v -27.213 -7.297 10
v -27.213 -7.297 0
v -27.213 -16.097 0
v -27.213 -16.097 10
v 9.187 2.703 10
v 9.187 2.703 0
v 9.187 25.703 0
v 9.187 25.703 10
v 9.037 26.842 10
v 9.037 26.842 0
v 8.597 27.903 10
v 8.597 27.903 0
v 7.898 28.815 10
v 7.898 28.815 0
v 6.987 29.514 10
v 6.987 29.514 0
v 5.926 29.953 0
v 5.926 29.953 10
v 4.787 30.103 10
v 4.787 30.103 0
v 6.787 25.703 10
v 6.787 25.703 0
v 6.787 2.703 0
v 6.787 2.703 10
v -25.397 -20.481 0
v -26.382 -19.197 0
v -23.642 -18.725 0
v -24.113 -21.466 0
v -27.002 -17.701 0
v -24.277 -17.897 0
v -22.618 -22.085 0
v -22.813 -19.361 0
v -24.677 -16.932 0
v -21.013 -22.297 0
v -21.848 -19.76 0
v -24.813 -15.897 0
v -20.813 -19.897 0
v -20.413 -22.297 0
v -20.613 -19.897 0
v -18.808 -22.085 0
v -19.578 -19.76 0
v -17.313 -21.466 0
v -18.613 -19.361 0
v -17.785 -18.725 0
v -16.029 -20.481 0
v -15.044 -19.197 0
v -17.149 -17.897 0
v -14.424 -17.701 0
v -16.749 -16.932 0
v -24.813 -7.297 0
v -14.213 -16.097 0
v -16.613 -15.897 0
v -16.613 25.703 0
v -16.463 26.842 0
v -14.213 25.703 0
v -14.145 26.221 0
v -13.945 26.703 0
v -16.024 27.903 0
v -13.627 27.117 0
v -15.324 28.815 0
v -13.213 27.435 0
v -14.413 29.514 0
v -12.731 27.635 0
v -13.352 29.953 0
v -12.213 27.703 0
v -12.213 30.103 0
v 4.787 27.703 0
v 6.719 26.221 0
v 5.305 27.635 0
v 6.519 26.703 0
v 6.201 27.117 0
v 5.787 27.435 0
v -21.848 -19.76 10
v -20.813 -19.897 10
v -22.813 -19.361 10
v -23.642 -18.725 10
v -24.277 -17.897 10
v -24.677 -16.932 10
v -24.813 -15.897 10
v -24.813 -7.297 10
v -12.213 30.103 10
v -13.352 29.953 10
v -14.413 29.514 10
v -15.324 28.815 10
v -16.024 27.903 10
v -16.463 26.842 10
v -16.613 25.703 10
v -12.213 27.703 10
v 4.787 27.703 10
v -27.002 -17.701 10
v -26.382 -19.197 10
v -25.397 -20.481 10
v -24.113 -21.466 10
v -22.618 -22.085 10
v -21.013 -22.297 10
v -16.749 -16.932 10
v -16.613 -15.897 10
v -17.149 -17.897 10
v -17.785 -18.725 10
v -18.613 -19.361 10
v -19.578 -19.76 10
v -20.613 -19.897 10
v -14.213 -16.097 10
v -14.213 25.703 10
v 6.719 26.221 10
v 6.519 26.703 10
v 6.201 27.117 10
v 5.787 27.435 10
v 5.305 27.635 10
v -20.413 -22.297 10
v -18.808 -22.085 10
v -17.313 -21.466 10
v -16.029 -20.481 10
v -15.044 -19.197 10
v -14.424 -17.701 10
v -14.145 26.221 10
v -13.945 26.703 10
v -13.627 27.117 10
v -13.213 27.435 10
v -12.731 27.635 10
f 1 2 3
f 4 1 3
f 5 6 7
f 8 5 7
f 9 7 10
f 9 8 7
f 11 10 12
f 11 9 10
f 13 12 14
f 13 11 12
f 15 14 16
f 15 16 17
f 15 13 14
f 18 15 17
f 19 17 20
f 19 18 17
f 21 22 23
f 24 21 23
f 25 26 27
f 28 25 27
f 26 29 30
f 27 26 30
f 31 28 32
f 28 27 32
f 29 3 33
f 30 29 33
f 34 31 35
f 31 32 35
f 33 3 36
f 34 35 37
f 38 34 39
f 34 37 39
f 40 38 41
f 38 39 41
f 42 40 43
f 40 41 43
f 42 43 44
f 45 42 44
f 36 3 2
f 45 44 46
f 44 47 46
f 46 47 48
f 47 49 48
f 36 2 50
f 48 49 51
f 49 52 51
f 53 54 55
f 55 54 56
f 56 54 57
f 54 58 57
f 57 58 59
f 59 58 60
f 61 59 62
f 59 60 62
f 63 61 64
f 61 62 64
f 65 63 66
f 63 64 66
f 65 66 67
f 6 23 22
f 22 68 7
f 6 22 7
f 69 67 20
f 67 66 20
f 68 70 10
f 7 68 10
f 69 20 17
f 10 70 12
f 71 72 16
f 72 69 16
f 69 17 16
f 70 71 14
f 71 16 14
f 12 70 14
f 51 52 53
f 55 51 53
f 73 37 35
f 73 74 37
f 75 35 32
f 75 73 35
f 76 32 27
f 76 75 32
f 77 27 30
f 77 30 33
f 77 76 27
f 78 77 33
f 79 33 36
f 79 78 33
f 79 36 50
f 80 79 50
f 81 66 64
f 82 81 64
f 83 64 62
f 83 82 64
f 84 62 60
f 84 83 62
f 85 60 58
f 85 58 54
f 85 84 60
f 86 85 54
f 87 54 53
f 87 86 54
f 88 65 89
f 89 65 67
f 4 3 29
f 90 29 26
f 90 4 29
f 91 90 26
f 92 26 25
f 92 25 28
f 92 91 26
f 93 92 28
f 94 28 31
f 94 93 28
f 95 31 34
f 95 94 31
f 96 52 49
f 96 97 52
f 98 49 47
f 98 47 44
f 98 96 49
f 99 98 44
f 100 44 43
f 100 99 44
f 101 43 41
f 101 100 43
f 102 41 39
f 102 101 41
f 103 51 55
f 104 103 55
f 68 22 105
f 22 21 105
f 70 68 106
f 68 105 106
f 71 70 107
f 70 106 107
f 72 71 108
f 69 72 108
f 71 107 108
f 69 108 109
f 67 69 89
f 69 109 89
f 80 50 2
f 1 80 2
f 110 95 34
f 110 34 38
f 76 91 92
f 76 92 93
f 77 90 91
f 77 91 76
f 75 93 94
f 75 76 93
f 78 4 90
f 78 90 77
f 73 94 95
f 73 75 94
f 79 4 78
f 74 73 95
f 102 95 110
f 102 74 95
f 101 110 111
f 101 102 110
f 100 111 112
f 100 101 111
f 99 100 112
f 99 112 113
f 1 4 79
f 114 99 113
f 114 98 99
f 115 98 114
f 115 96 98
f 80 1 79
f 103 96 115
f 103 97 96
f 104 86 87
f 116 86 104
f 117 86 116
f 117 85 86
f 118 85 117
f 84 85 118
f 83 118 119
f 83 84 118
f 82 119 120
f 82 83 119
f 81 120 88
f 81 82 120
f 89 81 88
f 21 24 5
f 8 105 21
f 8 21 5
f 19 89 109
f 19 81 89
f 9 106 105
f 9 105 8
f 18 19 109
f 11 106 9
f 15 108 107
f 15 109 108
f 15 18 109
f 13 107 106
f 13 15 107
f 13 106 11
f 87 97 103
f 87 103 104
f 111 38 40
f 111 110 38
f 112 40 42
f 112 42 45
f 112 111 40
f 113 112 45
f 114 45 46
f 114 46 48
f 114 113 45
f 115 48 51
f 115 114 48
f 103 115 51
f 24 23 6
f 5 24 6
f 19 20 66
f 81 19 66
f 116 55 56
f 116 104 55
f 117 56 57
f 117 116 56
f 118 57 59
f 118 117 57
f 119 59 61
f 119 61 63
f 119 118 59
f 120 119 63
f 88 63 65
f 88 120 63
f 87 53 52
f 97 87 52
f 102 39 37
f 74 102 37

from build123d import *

# Parameters (mm, degrees)
F1_DEPTH = 10
F2_R     = 2
F3_R     = 4.4
F4_R     = 4
F5_R     = 6.2


with BuildPart() as f1:
    # F0 (on Top) → F1 (new body)
    with BuildSketch(Plane.XY):
        Polygon((6.78689, 27.703254), (6.78689, 2.703254), (9.18689, 2.703254), (9.18689, 30.103254), (-16.61311, 30.103254), (-16.61311, -19.896746), (-24.81311, -19.896746), (-24.81311, -7.296746), (-27.21311, -7.296746), (-27.21311, -22.296746), (-14.21311, -22.296746), (-14.21311, 27.703254), align=None)
    extrude(amount=F1_DEPTH)

    # F2
    f2_edges = [f1.edges().sort_by_distance(p)[0] for p in [
        (-14.21311, 27.703254, 5),
        (6.78689, 27.703254, 5),
    ]]
    fillet(f2_edges, radius=F2_R)

    # F3
    f3_edges = [f1.edges().sort_by_distance(p)[0] for p in [
        (-16.61311, 30.103254, 5),
        (9.18689, 30.103254, 5),
    ]]
    fillet(f3_edges, radius=F3_R)

    # F4
    f4_edges = [f1.edges().sort_by_distance(p)[0] for p in [
        (-24.81311, -19.896746, 5),
        (-16.61311, -19.896746, 5),
    ]]
    fillet(f4_edges, radius=F4_R)

    # F5
    f5_edges = [f1.edges().sort_by_distance(p)[0] for p in [
        (-27.21311, -22.296746, 5),
        (-14.21311, -22.296746, 5),
    ]]
    fillet(f5_edges, radius=F5_R)


solid = f1.part
